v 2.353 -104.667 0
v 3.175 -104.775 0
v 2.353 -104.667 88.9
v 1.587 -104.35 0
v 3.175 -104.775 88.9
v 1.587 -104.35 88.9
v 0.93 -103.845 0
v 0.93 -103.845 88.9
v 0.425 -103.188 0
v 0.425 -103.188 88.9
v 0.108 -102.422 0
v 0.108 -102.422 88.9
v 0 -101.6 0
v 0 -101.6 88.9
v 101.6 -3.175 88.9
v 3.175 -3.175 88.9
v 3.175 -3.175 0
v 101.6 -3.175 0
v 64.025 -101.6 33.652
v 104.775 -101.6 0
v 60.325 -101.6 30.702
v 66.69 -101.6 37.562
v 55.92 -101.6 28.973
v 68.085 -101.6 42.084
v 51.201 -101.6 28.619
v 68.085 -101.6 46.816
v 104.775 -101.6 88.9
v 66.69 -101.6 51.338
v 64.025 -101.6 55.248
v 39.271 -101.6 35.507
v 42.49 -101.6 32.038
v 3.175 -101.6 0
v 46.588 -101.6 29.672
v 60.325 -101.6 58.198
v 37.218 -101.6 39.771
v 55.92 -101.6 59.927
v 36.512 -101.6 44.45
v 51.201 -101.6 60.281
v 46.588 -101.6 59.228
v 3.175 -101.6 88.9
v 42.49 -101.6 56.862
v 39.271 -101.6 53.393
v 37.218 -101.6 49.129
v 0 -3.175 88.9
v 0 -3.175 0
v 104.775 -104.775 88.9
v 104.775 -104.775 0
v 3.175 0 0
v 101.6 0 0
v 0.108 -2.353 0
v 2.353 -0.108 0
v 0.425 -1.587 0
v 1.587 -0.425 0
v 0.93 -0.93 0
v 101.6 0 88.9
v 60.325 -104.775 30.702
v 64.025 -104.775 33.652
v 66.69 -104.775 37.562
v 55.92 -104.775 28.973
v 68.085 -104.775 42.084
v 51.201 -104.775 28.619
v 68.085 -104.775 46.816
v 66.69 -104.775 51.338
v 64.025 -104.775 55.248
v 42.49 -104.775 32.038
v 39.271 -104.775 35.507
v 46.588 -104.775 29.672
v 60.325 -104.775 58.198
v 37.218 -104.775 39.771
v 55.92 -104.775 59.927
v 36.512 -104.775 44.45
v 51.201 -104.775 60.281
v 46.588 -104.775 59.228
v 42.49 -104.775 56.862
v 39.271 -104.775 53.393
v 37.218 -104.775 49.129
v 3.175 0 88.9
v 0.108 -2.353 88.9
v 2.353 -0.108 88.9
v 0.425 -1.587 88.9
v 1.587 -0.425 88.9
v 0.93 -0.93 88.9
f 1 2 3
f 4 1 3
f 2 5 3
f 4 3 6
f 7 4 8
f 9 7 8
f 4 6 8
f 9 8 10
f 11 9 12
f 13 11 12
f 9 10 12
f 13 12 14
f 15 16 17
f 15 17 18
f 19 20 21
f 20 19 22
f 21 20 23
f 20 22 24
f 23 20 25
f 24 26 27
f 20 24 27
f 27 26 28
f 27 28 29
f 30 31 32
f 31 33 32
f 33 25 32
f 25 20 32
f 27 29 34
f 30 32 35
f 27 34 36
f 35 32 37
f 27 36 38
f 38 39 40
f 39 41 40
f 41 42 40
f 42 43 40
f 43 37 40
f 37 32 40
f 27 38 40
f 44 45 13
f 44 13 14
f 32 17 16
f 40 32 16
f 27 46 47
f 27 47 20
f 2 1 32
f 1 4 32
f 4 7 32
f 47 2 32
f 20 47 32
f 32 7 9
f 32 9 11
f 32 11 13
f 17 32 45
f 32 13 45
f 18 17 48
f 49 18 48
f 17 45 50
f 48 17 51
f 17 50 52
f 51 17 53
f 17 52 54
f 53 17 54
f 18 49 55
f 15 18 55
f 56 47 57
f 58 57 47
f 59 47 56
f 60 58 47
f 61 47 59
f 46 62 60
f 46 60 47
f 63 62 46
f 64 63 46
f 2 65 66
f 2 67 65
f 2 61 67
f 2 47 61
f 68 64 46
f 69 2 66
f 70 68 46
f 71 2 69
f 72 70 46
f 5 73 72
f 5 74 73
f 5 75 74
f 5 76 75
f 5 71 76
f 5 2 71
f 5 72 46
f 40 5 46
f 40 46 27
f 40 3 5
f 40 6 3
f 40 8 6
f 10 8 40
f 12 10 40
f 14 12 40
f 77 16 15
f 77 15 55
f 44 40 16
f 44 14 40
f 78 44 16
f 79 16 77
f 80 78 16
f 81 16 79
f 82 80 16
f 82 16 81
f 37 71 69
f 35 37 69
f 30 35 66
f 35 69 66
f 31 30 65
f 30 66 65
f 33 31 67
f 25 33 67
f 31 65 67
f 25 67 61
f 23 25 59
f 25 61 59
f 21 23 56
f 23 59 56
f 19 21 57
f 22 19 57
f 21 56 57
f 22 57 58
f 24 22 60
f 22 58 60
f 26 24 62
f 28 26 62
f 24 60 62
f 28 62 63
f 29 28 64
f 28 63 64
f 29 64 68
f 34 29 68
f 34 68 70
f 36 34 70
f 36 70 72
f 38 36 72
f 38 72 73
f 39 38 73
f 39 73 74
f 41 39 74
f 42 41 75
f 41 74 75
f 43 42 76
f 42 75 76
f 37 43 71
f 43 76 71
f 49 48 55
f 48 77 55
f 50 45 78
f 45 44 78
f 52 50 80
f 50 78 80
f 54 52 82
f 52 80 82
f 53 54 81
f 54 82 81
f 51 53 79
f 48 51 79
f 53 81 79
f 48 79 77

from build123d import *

# Parameters (mm, degrees)
F0_W     = 101.6
F0_H     = 88.9
F1_DEPTH = 3.175
F2_W     = 3.175
F2_H     = 88.9
F3_DEPTH = 101.6
F4_W     = 3.175
F4_H     = 88.9
F5_DEPTH = 101.6
F7_DEPTH = 3.175
F8_R     = 3.175


with BuildPart() as f1:
    # F0 (on Front) → F1 (new body)
    with BuildSketch(Plane.XZ):
        with Locations((50.8, 44.45)):
            Rectangle(F0_W, F0_H)
    extrude(amount=F1_DEPTH)

    # F2 (on face) → F3 (join)
    with BuildSketch(Plane.XZ.offset(3.175)):
        with Locations((1.5875, 44.45)):
            Rectangle(F2_W, F2_H)
    extrude(amount=F3_DEPTH)

    # F4 (on face) → F5 (join)
    with BuildSketch(Plane.YZ.offset(3.175)):
        with Locations((-103.1875, 44.45)):
            Rectangle(F4_W, F4_H)
    extrude(amount=F5_DEPTH)

    # F6 (on face) → F7 (cut, through all)
    with BuildSketch(Plane.XZ.offset(104.775)):
        with BuildLine():
            Line((36.5125, 44.45), (68.2625, 44.45))
            ThreePointArc((68.2625, 44.45), (52.3875, 60.325), (36.5125, 44.45))
        make_face()
        with BuildLine():
            ThreePointArc((36.5125, 44.45), (52.3875, 28.575), (68.2625, 44.45))
            Line((68.2625, 44.45), (36.5125, 44.45))
        make_face()
    extrude(amount=-F7_DEPTH, mode=Mode.SUBTRACT)

    # F8
    f8_edges = [f1.edges().sort_by_distance(p)[0] for p in [
        (0, -104.775, 44.45),
        (0, 0, 44.45),
    ]]
    fillet(f8_edges, radius=F8_R)


solid = f1.part
